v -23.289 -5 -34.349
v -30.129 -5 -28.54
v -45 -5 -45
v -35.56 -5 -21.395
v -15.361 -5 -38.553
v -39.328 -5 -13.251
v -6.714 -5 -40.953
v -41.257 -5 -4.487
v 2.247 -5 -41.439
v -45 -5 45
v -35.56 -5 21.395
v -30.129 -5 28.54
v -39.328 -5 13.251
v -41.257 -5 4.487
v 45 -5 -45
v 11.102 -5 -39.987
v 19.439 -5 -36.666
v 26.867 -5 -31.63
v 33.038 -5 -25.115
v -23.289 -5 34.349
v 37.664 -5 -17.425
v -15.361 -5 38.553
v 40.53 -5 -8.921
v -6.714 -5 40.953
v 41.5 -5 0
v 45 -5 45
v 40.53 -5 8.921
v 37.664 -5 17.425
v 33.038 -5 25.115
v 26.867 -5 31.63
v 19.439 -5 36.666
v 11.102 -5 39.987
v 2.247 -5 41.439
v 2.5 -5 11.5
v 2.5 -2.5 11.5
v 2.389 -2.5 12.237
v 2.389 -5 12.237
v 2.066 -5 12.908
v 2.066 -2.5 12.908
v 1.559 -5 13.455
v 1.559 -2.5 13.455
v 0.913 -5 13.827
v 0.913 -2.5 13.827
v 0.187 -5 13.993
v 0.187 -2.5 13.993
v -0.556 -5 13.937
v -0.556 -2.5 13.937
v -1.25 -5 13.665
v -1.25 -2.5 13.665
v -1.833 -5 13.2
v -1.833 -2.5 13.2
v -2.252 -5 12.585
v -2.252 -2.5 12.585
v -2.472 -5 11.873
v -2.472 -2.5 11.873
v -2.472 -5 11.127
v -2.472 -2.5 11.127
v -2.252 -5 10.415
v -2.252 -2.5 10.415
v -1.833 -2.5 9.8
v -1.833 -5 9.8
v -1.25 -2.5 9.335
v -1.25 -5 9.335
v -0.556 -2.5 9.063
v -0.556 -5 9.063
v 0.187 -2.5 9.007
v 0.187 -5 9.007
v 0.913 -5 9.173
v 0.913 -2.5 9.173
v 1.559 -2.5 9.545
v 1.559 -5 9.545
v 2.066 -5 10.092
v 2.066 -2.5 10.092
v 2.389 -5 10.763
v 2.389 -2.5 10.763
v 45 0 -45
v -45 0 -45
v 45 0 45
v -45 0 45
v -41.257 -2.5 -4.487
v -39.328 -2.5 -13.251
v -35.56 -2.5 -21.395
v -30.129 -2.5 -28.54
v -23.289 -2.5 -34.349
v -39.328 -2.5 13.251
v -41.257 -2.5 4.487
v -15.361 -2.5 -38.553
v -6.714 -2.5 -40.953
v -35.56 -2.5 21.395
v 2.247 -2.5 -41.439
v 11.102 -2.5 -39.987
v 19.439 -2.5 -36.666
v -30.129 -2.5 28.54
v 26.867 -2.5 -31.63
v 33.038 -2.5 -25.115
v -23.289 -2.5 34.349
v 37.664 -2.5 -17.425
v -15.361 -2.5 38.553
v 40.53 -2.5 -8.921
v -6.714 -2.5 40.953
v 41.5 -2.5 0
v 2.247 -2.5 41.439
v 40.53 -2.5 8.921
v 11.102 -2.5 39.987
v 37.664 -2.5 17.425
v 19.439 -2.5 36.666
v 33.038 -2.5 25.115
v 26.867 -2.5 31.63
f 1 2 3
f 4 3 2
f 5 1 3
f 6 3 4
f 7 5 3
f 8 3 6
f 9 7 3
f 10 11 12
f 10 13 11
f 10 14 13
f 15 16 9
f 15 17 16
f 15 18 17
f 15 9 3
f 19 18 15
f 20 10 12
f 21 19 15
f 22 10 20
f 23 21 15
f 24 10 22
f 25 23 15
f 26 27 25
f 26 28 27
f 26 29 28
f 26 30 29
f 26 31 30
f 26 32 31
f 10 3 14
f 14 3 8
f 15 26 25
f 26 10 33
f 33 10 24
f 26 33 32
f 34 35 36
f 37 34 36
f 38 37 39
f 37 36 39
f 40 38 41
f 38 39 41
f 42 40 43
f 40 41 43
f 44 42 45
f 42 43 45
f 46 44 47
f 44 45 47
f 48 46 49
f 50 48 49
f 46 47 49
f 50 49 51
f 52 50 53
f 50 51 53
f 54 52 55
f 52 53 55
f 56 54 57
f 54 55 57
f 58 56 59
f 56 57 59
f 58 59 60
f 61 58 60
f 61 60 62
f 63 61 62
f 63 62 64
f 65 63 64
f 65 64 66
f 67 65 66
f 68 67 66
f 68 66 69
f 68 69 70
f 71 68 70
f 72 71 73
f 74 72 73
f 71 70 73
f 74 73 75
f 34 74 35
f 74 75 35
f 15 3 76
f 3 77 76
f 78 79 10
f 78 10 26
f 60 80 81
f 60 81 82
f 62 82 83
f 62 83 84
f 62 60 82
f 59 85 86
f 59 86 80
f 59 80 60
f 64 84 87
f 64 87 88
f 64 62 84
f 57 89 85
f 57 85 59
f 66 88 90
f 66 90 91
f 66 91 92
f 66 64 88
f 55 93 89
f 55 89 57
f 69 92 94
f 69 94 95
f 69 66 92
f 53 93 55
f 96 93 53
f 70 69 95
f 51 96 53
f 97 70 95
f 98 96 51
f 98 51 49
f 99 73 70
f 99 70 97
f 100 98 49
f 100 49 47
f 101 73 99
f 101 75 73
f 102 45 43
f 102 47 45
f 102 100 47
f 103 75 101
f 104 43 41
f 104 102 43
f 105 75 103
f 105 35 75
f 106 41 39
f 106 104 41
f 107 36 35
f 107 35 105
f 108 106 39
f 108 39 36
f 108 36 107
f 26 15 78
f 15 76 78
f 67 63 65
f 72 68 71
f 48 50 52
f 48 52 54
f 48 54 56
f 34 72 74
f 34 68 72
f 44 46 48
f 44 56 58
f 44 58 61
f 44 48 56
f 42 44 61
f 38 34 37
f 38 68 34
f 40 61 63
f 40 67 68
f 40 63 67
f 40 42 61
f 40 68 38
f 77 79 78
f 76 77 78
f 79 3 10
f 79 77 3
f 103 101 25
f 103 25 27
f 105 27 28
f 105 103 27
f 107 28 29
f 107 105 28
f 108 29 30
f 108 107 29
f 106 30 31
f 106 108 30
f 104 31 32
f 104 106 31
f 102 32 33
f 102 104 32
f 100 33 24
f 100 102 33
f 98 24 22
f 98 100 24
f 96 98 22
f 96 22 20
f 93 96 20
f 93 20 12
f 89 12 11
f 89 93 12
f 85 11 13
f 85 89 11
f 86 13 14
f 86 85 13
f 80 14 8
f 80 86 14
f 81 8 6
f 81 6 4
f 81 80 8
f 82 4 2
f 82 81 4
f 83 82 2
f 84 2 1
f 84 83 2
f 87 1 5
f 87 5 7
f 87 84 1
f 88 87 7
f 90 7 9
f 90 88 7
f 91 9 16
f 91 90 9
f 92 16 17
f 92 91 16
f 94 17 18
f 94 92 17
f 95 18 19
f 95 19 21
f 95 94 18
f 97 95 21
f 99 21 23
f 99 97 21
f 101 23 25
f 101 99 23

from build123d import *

# Parameters (mm, degrees)
F0_W     = 90
F0_H     = 90
F1_DEPTH = 2.5
F2_W     = 90
F2_H     = 90
F2_R     = 41.5
F3_DEPTH = 2.5
F4_R     = 2.5
F5_DEPTH = 2.5


with BuildPart() as f1:
    # F0 (on Front) → F1 (new body)
    with BuildSketch(Plane.XZ):
        Rectangle(F0_W, F0_H)
    extrude(amount=F1_DEPTH)

    # F2 (on face) → F3 (join)
    with BuildSketch(Plane.XZ.offset(2.5)):
        Rectangle(F2_W, F2_H)
        Circle(F2_R, mode=Mode.SUBTRACT)
    extrude(amount=F3_DEPTH)

    # F4 (on face) → F5 (join)
    with BuildSketch(Plane.XZ.offset(2.5)):
        with Locations((0, 11.5)):
            Circle(F4_R)
    extrude(amount=F5_DEPTH)


solid = f1.part
